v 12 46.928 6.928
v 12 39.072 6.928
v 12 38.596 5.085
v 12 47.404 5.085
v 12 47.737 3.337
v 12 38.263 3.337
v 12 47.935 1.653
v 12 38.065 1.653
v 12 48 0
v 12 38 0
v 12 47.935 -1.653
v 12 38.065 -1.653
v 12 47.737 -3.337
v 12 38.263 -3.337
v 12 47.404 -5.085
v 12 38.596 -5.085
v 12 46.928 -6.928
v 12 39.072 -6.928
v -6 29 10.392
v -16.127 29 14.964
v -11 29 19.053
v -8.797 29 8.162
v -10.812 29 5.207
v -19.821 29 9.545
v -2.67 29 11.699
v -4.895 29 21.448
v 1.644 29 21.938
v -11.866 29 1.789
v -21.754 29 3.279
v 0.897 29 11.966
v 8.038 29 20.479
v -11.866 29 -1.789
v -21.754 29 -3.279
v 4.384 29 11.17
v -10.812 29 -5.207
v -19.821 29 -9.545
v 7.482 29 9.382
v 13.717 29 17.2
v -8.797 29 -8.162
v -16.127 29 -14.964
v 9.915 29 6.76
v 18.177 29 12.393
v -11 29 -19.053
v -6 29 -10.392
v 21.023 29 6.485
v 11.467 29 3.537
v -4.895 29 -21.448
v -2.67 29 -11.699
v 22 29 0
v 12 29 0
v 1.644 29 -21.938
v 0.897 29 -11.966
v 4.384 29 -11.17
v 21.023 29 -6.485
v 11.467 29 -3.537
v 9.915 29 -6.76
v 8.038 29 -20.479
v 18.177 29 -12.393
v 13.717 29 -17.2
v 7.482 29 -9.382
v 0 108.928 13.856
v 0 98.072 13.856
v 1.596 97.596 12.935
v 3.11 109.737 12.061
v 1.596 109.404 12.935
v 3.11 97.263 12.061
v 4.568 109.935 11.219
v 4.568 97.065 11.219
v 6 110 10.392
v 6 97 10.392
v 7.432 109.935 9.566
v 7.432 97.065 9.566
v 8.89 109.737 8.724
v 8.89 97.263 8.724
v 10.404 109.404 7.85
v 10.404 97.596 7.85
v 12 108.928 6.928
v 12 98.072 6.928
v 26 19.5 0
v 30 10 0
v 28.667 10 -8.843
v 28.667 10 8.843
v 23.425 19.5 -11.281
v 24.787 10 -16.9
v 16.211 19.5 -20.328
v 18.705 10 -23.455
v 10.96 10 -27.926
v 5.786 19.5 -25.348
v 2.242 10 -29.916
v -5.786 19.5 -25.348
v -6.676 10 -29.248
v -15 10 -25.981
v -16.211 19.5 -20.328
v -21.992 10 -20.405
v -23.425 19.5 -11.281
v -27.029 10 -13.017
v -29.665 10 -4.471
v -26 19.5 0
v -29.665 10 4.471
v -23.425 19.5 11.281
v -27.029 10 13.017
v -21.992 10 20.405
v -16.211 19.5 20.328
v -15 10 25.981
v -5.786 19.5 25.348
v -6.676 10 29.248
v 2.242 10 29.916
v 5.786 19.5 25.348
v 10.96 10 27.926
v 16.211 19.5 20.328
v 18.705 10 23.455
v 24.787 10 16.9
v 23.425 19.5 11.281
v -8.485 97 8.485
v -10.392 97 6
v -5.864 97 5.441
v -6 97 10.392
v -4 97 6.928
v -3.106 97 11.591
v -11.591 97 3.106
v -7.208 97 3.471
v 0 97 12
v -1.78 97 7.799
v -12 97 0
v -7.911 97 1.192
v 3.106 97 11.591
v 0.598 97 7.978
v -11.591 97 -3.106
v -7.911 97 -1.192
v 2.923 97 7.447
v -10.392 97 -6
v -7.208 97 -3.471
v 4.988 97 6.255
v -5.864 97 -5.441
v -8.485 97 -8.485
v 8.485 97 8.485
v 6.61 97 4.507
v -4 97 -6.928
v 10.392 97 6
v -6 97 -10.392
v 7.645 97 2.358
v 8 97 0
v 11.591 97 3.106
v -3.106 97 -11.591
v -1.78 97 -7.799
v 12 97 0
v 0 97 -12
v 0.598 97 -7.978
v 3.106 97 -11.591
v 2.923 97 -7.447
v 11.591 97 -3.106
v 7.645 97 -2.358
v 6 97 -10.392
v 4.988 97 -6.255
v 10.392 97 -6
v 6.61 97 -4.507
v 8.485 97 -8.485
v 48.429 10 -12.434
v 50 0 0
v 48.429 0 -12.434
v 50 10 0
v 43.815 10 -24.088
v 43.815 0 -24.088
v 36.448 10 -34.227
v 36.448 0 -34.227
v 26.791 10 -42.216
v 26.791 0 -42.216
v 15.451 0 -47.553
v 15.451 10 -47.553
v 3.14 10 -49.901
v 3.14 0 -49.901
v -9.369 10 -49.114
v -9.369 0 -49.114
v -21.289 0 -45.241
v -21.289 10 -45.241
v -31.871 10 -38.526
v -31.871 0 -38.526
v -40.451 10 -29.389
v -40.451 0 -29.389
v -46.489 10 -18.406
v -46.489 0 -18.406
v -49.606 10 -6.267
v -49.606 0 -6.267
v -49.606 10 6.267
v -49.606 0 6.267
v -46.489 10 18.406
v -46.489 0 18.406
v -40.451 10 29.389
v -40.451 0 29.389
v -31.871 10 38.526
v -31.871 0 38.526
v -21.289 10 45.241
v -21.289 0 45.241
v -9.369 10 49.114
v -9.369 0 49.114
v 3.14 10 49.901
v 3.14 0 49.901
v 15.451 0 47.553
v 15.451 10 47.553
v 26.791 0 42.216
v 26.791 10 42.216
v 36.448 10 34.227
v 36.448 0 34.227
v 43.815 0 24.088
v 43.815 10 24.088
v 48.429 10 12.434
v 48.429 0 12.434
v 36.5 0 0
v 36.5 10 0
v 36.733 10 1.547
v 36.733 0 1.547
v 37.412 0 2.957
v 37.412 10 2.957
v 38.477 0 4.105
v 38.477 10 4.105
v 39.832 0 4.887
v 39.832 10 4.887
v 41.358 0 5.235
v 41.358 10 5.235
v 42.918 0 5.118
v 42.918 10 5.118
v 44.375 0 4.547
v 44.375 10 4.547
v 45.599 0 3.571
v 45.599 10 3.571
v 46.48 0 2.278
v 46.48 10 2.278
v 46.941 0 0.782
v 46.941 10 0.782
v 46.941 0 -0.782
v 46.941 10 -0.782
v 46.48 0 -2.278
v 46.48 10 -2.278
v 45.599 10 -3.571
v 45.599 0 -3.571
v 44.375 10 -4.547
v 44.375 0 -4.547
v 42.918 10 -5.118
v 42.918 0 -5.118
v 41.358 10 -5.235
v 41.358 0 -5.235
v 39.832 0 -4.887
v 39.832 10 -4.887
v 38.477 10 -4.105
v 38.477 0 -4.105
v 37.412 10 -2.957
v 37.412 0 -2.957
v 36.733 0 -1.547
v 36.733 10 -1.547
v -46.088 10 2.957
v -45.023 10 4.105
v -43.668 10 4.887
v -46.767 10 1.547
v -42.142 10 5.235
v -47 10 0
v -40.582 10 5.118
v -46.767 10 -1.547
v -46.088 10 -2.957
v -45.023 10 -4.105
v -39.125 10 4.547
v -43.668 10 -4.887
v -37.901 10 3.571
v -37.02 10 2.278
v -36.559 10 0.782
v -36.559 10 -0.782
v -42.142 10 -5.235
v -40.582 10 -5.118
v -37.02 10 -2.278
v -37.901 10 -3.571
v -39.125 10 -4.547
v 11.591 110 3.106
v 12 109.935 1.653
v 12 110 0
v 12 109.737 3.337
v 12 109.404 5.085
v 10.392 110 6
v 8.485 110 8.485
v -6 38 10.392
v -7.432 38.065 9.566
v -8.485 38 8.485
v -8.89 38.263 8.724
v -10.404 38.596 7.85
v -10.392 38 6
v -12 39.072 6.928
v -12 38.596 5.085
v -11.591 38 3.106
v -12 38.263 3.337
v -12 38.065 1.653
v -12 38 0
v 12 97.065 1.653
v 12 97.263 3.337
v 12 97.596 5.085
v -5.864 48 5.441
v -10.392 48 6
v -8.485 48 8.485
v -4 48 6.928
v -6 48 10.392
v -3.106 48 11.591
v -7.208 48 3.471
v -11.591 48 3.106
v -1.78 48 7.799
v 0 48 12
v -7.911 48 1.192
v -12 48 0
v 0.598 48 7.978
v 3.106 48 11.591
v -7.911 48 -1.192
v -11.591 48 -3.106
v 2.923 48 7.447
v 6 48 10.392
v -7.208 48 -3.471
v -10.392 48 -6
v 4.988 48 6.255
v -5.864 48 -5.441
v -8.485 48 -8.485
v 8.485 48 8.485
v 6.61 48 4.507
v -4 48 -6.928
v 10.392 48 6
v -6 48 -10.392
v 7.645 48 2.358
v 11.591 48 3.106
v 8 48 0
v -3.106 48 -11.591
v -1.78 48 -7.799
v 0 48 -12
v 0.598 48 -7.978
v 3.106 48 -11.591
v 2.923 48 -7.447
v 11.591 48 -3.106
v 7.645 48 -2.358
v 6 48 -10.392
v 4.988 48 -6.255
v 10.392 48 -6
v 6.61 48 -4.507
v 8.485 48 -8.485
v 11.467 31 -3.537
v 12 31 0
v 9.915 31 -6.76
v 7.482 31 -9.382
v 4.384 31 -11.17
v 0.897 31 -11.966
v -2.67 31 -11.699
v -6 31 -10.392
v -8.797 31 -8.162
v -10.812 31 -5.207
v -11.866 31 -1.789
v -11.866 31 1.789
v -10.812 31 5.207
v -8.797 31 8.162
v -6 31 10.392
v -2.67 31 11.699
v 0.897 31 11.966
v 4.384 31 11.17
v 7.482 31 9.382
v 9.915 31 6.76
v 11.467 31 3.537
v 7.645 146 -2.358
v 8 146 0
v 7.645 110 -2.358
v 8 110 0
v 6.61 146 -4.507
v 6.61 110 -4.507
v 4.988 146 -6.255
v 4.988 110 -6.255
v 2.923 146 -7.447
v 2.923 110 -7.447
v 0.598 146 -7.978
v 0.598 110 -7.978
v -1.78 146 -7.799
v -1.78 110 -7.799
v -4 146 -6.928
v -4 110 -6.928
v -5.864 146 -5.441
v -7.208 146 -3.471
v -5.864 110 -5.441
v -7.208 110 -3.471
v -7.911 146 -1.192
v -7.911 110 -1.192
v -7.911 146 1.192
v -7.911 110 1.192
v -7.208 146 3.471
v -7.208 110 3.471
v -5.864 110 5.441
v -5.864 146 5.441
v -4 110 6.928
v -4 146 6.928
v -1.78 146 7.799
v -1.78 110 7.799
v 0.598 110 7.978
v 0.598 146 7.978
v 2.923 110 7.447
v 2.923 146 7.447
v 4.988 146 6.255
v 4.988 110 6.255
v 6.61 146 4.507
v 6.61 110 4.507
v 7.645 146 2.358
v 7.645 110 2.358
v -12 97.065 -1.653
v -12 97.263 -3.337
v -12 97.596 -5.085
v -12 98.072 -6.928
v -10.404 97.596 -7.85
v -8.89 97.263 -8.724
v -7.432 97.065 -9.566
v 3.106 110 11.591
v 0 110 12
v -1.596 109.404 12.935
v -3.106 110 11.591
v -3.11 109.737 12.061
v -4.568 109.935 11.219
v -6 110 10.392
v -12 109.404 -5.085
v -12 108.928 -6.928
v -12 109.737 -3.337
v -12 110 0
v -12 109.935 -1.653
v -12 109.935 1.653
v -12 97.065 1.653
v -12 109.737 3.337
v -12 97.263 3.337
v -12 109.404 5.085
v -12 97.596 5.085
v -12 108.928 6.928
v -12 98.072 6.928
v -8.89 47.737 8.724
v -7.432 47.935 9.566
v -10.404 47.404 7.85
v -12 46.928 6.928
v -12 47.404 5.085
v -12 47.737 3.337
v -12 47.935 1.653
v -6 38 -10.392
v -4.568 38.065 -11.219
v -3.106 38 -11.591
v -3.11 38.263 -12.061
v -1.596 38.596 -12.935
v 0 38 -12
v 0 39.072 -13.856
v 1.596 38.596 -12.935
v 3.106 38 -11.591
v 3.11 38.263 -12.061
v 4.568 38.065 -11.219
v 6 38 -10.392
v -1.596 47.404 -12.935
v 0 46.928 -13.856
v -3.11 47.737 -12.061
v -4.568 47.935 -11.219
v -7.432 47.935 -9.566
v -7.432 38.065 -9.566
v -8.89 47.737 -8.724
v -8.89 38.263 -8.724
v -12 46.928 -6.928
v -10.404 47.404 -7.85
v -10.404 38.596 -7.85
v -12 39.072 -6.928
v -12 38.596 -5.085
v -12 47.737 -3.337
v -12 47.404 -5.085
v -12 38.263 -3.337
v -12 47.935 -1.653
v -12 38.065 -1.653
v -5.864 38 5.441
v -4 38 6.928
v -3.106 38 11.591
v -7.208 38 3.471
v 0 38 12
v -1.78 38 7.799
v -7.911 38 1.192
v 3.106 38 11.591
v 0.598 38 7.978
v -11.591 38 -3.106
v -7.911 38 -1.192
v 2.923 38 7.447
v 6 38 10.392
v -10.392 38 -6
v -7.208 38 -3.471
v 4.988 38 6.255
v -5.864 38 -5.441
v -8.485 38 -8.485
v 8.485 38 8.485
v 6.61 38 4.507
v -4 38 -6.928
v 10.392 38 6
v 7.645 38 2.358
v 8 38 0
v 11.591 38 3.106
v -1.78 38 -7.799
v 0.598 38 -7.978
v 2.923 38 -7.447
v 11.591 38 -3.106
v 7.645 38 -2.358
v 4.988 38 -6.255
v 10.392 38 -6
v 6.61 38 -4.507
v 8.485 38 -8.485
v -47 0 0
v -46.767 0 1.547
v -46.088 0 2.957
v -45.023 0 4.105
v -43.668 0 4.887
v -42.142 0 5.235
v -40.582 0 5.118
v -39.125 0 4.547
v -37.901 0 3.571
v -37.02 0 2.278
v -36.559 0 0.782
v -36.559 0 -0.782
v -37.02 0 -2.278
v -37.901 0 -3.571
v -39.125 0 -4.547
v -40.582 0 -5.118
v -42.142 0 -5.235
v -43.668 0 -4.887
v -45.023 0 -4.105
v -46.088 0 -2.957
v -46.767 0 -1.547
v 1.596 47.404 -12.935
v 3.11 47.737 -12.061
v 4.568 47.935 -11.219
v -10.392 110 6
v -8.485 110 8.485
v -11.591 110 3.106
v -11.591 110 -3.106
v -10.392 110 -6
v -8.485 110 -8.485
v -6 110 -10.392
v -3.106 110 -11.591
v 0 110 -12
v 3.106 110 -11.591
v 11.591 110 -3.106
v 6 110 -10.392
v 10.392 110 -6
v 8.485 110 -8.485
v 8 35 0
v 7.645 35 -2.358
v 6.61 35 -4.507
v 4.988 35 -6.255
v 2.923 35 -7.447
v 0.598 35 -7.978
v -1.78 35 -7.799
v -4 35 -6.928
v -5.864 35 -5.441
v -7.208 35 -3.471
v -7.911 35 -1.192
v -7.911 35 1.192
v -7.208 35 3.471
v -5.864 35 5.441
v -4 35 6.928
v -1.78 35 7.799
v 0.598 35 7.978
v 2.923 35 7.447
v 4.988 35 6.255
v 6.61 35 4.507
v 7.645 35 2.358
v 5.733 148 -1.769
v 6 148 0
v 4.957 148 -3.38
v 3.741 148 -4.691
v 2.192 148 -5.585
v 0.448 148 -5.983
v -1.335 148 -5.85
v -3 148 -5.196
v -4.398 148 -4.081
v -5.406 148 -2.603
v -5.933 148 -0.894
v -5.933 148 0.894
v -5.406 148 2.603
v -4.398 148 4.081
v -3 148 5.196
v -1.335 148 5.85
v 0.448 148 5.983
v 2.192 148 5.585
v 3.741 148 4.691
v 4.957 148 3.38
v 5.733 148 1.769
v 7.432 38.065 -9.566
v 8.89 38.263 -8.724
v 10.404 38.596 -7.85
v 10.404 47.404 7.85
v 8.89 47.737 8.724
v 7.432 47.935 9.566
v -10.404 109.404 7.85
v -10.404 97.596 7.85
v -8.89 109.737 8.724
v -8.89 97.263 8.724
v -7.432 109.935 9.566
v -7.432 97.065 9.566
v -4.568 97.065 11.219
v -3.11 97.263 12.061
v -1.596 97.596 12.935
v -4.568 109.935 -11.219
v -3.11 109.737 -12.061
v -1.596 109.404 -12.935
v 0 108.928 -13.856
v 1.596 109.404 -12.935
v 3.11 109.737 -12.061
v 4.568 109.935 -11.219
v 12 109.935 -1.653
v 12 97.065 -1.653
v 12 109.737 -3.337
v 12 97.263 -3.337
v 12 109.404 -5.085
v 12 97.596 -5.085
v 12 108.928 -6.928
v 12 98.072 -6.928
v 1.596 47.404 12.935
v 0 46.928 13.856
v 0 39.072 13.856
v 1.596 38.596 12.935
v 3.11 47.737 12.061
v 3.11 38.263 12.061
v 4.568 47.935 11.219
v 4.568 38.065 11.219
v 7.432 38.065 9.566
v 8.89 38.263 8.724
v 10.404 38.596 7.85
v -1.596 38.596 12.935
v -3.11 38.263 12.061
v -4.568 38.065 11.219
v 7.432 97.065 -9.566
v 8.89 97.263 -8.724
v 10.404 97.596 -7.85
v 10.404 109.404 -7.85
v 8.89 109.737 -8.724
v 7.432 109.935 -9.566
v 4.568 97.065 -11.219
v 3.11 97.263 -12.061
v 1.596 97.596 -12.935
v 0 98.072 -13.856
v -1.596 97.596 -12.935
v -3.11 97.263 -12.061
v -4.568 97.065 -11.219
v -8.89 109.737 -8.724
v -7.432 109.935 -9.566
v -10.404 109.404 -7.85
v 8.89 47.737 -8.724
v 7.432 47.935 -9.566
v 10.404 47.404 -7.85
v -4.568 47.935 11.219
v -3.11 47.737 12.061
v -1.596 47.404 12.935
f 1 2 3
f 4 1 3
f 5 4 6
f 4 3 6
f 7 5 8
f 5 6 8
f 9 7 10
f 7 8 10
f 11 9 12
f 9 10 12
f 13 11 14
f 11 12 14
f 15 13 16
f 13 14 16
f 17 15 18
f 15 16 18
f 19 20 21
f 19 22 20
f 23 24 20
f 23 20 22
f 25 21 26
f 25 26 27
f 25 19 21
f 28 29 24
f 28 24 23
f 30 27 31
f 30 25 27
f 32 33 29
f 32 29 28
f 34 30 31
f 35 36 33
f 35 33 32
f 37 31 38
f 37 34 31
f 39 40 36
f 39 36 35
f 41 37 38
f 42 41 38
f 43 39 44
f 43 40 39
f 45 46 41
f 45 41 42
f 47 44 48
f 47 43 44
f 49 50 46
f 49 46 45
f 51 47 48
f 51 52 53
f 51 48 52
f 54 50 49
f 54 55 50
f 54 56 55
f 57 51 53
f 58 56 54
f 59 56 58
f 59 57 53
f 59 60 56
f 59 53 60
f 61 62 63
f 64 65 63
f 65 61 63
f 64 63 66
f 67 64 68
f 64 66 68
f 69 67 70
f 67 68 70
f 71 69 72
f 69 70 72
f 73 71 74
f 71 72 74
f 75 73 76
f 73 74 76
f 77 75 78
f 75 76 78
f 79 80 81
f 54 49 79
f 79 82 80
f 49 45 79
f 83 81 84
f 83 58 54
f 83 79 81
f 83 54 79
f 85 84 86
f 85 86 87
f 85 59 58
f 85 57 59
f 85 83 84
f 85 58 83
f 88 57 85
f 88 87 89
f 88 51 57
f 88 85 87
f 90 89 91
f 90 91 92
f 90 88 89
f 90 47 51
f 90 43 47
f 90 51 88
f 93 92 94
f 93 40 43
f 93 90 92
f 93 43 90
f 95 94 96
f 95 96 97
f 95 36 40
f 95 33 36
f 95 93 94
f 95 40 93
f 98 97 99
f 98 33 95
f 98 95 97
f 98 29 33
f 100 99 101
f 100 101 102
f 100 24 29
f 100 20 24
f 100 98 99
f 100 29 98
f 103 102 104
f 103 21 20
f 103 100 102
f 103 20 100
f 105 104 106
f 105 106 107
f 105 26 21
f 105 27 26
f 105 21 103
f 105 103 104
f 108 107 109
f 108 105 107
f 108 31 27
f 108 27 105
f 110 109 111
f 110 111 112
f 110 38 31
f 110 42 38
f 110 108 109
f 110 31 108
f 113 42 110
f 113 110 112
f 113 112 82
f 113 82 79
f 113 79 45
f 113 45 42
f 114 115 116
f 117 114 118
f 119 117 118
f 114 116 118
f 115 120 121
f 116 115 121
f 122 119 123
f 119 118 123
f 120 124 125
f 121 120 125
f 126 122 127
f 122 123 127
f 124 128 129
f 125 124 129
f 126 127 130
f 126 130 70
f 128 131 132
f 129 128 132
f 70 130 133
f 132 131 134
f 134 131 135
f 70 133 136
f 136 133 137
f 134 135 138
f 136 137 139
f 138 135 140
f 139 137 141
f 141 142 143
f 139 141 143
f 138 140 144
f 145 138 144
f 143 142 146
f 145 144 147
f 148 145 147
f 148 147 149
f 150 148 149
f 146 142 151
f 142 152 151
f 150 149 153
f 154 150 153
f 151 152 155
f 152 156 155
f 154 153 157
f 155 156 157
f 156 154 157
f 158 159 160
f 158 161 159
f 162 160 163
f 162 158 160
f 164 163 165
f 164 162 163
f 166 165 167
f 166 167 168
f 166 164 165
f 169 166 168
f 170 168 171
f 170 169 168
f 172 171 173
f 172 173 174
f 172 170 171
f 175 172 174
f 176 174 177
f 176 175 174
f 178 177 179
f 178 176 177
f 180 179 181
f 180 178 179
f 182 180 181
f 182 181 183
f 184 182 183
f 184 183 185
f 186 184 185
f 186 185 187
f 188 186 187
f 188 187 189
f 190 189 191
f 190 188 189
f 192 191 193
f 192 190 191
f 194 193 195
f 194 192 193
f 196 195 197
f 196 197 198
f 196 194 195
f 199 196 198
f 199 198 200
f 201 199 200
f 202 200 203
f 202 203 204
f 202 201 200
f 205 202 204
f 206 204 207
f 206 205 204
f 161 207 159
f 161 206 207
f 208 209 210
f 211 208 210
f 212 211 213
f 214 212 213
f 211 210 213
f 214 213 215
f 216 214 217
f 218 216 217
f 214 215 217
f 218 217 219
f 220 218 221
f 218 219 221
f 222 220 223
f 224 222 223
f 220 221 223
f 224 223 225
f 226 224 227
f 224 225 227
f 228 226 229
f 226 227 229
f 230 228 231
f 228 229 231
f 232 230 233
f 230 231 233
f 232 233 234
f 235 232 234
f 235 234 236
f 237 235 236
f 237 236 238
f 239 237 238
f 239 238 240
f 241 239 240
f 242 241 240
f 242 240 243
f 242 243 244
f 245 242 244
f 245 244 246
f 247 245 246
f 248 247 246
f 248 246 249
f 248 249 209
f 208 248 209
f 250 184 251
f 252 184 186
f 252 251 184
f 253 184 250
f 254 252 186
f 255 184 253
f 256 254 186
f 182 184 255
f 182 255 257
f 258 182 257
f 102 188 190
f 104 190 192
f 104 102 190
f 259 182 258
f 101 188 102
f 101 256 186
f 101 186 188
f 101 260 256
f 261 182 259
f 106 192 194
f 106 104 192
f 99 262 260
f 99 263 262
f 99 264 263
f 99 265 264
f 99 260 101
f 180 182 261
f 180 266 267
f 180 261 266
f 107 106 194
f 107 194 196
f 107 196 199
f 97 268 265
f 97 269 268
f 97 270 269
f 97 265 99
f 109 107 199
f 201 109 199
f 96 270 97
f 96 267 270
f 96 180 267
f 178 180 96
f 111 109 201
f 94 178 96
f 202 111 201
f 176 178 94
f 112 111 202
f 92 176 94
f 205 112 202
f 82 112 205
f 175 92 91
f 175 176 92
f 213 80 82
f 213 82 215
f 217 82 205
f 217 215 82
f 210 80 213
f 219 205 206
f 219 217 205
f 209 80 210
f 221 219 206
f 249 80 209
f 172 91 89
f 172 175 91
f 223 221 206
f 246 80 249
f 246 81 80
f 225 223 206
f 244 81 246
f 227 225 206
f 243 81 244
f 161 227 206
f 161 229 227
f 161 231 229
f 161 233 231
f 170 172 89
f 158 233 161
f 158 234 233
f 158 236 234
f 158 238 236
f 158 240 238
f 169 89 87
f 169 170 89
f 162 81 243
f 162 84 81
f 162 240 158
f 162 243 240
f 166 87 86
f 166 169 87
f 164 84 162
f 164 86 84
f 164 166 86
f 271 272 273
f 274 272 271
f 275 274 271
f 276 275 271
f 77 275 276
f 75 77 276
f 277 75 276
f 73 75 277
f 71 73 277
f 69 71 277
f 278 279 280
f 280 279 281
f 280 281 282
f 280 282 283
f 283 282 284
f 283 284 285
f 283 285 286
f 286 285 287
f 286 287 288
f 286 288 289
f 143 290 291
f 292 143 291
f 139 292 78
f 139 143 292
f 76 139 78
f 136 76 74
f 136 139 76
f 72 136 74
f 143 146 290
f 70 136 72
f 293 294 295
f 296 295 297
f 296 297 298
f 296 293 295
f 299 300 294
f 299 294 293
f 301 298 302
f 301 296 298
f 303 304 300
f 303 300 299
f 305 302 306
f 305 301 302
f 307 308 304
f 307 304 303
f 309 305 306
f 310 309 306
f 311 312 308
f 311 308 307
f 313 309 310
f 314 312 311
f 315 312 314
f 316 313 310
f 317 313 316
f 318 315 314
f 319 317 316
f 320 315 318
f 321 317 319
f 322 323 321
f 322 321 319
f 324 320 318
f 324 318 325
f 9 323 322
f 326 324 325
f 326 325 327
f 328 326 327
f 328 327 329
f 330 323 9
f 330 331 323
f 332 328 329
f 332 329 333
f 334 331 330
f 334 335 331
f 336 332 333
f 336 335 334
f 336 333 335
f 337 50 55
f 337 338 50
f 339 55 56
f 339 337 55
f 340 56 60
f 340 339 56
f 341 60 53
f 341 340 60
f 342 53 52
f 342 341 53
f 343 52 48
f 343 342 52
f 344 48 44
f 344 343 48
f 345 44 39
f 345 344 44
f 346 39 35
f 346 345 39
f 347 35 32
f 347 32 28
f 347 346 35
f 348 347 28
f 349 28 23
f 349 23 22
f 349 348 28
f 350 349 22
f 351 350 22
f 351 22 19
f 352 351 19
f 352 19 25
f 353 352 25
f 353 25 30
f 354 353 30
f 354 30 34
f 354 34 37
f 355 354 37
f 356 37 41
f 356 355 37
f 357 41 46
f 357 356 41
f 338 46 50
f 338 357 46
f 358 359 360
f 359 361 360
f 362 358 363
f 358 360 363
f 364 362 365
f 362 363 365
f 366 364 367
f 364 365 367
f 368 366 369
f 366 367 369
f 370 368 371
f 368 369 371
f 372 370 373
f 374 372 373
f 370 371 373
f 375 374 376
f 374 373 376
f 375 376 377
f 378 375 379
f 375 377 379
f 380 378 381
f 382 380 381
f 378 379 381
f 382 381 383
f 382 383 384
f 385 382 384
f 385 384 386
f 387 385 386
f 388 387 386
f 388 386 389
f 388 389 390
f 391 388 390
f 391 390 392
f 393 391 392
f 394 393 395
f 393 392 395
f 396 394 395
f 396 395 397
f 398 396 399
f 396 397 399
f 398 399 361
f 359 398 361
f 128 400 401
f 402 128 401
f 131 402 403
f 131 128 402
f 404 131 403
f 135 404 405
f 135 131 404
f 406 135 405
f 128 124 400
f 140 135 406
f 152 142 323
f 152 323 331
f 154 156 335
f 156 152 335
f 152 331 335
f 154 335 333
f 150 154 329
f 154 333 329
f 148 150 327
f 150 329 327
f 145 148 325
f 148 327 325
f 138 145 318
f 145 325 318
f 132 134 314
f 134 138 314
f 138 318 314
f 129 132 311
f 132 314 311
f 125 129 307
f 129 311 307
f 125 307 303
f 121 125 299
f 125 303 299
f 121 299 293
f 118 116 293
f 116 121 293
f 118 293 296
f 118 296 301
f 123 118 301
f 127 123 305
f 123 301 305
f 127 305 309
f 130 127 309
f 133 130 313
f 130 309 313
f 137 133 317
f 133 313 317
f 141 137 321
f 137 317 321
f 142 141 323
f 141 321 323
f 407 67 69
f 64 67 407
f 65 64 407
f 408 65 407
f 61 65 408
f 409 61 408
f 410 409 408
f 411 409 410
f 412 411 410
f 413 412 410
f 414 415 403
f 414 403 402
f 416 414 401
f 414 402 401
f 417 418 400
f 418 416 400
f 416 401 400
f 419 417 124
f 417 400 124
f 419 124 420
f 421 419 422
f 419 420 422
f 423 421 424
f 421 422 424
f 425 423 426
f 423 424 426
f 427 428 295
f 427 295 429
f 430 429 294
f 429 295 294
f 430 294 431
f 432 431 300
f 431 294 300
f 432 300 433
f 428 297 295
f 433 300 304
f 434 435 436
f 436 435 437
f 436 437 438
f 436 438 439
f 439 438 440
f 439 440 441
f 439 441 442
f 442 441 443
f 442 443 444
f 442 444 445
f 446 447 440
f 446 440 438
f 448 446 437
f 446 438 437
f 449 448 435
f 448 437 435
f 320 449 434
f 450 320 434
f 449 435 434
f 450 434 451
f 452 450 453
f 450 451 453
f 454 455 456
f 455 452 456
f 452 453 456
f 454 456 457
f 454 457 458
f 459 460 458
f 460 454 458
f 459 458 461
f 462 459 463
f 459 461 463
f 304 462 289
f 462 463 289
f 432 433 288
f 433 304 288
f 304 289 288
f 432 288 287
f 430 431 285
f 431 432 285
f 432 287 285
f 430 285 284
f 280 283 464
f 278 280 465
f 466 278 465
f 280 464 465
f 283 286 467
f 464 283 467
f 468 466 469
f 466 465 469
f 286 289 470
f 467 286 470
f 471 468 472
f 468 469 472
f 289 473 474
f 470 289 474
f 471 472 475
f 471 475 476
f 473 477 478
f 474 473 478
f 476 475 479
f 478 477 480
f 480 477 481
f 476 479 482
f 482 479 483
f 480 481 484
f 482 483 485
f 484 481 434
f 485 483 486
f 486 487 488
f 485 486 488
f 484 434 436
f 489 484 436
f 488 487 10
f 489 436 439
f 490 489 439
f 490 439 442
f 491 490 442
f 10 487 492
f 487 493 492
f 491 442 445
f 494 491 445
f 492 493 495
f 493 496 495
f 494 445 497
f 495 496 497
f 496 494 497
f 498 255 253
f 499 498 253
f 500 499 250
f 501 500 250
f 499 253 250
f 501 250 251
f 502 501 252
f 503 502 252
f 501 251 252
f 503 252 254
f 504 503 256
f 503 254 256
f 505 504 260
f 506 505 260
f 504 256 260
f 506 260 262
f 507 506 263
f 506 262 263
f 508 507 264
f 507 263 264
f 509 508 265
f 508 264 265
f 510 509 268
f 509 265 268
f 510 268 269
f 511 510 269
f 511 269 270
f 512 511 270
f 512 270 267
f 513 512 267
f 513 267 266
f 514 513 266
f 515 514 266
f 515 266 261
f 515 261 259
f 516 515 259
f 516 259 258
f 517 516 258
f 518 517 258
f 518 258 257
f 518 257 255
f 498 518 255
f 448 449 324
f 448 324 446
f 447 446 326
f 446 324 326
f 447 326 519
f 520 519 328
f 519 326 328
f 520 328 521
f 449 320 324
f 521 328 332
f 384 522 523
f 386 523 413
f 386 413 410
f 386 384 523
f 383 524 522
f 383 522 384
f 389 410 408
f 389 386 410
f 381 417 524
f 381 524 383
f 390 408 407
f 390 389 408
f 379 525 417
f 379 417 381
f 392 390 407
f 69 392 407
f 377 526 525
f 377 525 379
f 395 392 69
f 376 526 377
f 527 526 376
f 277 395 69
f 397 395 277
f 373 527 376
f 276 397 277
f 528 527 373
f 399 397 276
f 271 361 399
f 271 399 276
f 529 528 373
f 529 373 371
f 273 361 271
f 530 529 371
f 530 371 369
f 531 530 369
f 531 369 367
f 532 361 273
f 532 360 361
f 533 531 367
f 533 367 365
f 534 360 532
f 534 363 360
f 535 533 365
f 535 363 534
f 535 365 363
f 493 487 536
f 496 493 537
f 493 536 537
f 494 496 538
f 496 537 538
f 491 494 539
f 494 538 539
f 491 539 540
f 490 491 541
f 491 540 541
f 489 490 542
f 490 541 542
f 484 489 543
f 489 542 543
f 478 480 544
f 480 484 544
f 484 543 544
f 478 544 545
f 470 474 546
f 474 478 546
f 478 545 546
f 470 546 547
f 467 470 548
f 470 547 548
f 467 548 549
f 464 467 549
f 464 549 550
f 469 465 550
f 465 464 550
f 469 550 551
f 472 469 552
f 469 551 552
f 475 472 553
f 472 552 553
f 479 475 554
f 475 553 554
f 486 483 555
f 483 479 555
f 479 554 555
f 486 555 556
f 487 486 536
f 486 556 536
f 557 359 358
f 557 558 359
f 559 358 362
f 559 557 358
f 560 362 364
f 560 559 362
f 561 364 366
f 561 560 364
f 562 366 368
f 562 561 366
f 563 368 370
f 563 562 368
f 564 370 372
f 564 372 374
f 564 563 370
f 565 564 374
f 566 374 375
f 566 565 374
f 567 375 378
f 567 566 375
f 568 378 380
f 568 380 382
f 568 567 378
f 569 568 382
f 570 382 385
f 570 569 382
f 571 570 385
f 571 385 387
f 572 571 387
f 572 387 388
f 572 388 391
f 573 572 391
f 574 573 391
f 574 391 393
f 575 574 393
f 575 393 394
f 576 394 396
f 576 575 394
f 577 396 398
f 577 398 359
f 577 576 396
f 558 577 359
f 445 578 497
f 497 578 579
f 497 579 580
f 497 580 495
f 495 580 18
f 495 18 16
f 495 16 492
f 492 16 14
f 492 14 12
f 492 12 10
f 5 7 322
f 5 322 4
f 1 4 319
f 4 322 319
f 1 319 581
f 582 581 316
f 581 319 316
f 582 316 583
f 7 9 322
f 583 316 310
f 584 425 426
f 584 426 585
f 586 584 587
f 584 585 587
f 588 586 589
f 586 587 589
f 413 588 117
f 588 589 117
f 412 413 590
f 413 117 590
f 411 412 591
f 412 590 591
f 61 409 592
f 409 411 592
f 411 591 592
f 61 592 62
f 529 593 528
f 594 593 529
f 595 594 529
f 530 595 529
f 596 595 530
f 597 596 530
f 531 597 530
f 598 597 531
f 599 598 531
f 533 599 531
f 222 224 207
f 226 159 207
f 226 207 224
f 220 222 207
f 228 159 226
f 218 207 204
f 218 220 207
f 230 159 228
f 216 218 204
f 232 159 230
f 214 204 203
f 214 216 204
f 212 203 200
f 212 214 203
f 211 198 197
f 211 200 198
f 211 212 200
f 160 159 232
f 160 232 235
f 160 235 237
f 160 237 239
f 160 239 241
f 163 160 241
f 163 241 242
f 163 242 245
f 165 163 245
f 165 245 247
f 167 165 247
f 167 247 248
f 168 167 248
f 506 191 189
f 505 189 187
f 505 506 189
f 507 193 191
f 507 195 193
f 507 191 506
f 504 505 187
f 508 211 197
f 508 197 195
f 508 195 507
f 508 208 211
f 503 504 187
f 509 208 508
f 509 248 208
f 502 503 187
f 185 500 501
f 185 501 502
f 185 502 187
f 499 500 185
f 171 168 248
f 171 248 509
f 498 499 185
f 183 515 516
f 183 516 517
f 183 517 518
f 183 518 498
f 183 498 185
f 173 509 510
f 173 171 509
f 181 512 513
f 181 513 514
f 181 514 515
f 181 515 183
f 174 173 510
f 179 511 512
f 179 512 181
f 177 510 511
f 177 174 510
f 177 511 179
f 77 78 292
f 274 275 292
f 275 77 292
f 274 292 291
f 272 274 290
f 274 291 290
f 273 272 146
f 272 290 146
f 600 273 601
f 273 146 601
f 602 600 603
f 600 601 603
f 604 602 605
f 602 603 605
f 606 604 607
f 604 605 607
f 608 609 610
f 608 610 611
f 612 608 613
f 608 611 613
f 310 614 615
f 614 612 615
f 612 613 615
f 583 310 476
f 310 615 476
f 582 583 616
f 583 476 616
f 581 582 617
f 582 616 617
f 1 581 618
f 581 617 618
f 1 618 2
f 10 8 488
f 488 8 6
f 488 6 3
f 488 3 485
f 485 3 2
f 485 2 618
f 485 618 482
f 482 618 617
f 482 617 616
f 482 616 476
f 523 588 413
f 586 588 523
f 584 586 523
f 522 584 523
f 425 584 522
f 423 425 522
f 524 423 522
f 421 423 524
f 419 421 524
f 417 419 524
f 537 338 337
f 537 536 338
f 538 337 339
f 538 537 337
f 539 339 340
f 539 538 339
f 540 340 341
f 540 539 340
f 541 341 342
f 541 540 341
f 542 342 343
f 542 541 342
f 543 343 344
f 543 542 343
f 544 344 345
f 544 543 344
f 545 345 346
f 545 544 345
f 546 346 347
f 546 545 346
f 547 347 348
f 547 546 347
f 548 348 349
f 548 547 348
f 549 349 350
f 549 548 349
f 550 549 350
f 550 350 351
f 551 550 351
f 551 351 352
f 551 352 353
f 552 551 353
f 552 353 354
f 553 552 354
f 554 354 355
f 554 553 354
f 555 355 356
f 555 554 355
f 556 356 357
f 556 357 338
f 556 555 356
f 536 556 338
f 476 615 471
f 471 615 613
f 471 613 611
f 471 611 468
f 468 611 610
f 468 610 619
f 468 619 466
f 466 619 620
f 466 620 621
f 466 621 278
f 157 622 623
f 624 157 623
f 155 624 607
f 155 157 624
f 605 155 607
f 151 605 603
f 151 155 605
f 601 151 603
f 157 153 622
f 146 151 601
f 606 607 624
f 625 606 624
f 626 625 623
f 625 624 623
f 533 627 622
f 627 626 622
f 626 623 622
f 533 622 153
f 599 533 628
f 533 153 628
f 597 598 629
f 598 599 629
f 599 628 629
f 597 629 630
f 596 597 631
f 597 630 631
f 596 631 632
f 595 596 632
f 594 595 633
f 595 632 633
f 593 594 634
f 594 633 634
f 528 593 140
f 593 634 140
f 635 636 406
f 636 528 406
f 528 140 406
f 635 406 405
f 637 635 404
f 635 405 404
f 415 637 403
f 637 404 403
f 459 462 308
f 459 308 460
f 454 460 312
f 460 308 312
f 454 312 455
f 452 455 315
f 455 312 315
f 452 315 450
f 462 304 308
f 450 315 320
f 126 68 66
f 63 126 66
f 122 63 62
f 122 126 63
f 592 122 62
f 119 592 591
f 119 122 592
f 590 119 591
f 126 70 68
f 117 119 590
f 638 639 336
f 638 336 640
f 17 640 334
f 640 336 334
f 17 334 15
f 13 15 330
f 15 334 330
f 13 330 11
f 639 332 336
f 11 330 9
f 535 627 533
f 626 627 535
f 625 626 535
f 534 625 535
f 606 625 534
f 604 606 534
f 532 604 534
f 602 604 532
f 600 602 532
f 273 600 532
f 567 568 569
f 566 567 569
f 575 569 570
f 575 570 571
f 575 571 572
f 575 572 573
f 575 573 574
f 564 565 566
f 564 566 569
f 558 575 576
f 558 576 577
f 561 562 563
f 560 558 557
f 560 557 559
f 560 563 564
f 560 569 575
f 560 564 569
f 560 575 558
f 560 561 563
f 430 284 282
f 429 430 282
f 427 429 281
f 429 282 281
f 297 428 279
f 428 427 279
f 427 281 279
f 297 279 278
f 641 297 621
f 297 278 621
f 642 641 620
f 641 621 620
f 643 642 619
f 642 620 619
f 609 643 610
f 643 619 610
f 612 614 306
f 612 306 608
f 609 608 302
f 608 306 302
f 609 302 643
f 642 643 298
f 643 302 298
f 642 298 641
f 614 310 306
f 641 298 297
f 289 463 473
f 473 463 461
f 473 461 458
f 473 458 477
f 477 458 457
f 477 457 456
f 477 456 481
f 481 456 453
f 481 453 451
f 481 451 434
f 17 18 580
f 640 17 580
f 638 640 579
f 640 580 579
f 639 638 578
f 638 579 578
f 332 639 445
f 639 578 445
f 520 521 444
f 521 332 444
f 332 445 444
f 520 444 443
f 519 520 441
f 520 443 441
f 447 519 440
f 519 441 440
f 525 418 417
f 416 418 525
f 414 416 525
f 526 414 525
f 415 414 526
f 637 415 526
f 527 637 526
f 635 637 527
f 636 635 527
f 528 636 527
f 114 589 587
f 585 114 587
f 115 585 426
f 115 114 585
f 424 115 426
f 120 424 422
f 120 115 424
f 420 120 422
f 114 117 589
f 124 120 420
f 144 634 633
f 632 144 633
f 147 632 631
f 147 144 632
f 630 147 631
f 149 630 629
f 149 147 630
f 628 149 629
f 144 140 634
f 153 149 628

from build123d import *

# Parameters (mm, degrees)
EXTRUDE_1_DEPTH     = 10
EXTRUDE_2_DEPTH     = 13
SKETCH_5_R          = 5.25
CUT_EXTRUDE_1_DEPTH = 11


with BuildPart() as part:
    # Эскиз1 → Повернуть1 (revolve)
    with BuildSketch(Plane.XY, mode=Mode.PRIVATE) as revolve_1_sk:
        Polygon((0, 0), (-50, 0), (-50, 10), (-30, 10), (-22, 29), (-12, 29), (-12, 31), (-8, 35), (-8, 38), (-8, 48), (-8, 146), (-6, 148), (0, 148), align=None)
    revolve(revolve_1_sk.sketch.rotate(Axis((0, 0, 0), (0, 1, 0)), 180), axis=Axis((0, 0, 0), (0, 1, 0)))  # turned: the seam where the file's is

    # Эскиз2 → Бобышка-Вытянуть1 (add)
    with BuildSketch(Plane(origin=(0, 38, 0), x_dir=(1, 0, 0), z_dir=(0, 1, 0))):
        Polygon((0, 13.856406461), (-12, 6.92820323), (-12, -6.92820323), (0, -13.856406461), (12, -6.92820323), (12, 6.92820323), align=None)
    extrude(amount=EXTRUDE_1_DEPTH)

    # Эскиз3 → Бобышка-Вытянуть2 (add)
    with BuildSketch(Plane(origin=(0, 97, 0), x_dir=(1, 0, 0), z_dir=(0, 1, 0))):
        Polygon((12, 6.92820323), (0, 13.856406461), (-12, 6.92820323), (-12, -6.92820323), (0, -13.856406461), (12, -6.92820323), align=None)
    extrude(amount=EXTRUDE_2_DEPTH)

    # Эскиз4 → Вырез-Повернуть2 (revolve, cut)
    with BuildSketch(Plane.XY, mode=Mode.PRIVATE) as cut_revolve_2_sk:
        Polygon((-23.258330249, 110), (-12, 110), (-23.258330249, 103.5), align=None)
        Polygon((-23.258330249, 97), (-23.258330249, 103.5), (-12, 97), align=None)
        Polygon((-20.660254038, 48), (-20.660254038, 43), (-12, 48), align=None)
        Polygon((-20.660254038, 43), (-20.660254038, 38), (-12, 38), align=None)
    revolve(cut_revolve_2_sk.sketch.rotate(Axis((0, 148, 0), (0, -1, 0)), 180), axis=Axis((0, 148, 0), (0, -1, 0)), mode=Mode.SUBTRACT)  # turned: the seam where the file's is

    # Эскиз5 → Вырез-Вытянуть1 (cut, through all)
    with BuildSketch(Plane(origin=(0, 10, 0), x_dir=(1, 0, 0), z_dir=(0, 1, 0))):
        with Locations(Location((-41.75, 0, 0), (0, 0, 180))):  # turned: the seam where the file's is
            Circle(SKETCH_5_R)
        with Locations(Location((41.75, 0, 0), (0, 0, 180))):  # turned: the seam where the file's is
            Circle(SKETCH_5_R)
    extrude(amount=-CUT_EXTRUDE_1_DEPTH, mode=Mode.SUBTRACT)


solid = part.part
